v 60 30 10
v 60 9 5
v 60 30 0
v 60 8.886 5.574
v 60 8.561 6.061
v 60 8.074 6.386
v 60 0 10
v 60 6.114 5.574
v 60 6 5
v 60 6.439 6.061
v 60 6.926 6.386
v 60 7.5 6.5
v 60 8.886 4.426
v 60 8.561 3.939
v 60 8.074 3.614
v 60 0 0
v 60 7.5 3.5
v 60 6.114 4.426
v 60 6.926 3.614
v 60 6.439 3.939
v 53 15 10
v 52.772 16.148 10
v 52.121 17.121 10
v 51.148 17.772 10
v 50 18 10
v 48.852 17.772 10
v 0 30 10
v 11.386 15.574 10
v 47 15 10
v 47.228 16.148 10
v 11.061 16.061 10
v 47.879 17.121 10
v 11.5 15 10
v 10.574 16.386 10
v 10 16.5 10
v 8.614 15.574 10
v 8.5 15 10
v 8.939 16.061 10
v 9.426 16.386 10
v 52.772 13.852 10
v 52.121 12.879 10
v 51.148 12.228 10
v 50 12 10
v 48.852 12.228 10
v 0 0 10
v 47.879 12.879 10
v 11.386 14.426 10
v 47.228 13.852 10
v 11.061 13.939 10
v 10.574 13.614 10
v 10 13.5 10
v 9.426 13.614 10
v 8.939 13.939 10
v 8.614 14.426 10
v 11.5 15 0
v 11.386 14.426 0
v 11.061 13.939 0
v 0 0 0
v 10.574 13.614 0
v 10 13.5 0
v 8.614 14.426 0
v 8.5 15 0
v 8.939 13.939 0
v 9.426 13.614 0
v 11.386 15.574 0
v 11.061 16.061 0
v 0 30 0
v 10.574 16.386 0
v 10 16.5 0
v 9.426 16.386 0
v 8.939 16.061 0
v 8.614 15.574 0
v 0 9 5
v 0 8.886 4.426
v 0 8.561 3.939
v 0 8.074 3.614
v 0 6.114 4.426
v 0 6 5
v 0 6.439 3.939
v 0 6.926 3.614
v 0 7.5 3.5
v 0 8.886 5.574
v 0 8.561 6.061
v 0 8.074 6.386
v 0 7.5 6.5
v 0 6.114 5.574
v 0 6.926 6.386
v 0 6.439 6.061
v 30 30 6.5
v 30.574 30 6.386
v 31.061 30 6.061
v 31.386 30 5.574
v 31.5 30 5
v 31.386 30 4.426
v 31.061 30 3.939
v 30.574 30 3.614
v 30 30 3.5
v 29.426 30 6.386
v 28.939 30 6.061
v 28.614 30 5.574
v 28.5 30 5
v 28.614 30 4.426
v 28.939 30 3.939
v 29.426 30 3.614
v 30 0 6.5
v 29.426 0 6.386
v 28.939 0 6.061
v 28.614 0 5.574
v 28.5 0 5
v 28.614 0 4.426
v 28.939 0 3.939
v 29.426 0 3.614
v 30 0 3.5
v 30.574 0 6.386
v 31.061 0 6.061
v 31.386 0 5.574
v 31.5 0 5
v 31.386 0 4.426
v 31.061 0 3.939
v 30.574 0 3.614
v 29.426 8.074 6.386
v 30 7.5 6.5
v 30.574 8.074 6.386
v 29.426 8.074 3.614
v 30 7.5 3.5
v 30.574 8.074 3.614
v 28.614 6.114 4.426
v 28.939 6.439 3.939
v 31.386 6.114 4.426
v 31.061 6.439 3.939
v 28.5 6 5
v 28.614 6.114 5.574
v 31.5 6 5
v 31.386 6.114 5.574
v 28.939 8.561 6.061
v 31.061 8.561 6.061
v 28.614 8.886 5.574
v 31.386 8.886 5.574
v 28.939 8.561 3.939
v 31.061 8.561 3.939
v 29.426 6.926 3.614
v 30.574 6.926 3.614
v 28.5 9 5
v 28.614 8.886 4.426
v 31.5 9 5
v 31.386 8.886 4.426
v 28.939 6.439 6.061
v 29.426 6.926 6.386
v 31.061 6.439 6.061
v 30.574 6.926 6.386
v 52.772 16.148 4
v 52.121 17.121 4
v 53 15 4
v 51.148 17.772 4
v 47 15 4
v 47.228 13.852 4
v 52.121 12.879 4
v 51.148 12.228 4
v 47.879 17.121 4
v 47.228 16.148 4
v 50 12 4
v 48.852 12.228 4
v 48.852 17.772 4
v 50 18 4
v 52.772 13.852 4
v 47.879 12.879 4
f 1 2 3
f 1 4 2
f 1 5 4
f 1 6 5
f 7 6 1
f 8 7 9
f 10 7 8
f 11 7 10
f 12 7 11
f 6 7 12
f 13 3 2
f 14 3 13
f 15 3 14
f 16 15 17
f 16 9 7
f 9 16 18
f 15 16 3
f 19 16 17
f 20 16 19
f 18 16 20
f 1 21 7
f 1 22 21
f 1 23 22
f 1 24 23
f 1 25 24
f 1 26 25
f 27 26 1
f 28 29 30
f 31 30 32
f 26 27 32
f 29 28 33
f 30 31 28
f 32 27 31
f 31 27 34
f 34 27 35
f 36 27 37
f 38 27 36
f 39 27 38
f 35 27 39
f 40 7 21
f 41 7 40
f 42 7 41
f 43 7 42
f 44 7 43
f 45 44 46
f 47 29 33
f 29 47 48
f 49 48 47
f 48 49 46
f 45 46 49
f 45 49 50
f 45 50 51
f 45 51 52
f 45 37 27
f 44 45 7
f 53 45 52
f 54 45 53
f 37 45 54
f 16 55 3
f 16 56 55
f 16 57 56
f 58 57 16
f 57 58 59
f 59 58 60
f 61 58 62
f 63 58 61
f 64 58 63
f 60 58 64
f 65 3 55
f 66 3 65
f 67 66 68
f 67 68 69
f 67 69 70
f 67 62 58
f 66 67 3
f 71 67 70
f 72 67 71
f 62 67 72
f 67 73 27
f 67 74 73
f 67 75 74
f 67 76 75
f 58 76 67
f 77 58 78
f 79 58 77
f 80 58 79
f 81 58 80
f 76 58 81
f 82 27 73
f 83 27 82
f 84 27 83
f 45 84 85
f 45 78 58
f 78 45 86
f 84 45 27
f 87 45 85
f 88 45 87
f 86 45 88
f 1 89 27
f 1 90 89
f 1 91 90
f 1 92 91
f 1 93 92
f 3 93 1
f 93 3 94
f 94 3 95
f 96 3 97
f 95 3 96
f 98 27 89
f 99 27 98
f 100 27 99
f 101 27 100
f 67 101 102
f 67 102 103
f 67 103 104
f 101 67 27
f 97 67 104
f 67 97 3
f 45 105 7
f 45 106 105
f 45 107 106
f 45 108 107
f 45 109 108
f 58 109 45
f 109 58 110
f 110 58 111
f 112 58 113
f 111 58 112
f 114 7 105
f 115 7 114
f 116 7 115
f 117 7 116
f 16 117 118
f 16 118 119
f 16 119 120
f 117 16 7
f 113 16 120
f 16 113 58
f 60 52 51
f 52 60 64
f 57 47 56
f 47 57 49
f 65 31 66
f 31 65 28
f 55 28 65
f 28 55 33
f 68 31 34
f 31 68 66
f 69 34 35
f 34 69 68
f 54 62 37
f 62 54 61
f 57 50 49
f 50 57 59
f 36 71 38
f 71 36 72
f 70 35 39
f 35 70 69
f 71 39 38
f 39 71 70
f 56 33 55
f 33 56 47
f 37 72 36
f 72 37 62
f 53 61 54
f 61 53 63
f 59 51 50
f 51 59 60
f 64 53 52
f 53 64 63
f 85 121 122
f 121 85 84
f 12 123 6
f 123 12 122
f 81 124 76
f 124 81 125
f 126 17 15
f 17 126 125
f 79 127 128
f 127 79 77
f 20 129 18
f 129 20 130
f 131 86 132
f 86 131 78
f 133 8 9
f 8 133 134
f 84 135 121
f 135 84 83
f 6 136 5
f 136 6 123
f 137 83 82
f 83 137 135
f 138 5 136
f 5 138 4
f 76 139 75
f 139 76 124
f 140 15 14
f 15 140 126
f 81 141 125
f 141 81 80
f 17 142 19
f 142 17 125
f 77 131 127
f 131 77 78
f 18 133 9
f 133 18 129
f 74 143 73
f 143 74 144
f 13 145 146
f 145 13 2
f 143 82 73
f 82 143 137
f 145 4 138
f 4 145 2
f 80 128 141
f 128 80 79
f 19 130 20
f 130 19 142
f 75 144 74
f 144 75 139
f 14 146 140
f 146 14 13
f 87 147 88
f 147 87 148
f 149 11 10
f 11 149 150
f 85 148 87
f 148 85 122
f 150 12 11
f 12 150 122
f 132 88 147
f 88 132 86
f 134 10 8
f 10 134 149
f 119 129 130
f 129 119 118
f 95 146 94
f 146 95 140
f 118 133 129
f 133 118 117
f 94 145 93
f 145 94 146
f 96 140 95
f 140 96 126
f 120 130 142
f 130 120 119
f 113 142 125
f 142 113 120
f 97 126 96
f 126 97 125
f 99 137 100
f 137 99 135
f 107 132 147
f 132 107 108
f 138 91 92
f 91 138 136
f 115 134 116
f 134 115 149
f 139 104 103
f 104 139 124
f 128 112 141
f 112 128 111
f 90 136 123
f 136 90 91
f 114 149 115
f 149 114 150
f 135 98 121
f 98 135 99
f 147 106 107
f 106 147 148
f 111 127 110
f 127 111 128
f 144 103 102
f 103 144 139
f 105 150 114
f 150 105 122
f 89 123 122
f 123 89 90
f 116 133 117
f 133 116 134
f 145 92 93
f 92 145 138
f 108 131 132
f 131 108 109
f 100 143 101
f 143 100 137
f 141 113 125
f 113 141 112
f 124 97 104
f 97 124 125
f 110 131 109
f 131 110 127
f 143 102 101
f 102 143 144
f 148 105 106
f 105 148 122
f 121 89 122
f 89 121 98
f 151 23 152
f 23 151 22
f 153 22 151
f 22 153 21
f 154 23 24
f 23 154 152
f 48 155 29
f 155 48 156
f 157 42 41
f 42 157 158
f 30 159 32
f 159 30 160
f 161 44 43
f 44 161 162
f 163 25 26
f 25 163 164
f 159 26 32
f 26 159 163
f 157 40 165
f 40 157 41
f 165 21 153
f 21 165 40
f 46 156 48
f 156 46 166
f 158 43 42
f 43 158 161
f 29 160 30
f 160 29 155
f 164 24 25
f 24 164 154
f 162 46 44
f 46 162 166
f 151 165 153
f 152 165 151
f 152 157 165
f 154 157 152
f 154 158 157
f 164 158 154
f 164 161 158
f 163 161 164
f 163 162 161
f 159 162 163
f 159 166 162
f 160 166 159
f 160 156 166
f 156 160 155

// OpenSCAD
use <../nscad-lib.scad>

color("lightgray") difference() {
  cube([60, 30, 10]);
  move(10, 15)  m3hole();               // senkrecht
  move(-1, 7.5, 5) m3holeX(70);         // entlang X
  move(30, -1, 5)  m3holeY(40);         // entlang Y
  move(50, 15, 5)  m3hole(d = 6);       // anderer Durchmesser
}
